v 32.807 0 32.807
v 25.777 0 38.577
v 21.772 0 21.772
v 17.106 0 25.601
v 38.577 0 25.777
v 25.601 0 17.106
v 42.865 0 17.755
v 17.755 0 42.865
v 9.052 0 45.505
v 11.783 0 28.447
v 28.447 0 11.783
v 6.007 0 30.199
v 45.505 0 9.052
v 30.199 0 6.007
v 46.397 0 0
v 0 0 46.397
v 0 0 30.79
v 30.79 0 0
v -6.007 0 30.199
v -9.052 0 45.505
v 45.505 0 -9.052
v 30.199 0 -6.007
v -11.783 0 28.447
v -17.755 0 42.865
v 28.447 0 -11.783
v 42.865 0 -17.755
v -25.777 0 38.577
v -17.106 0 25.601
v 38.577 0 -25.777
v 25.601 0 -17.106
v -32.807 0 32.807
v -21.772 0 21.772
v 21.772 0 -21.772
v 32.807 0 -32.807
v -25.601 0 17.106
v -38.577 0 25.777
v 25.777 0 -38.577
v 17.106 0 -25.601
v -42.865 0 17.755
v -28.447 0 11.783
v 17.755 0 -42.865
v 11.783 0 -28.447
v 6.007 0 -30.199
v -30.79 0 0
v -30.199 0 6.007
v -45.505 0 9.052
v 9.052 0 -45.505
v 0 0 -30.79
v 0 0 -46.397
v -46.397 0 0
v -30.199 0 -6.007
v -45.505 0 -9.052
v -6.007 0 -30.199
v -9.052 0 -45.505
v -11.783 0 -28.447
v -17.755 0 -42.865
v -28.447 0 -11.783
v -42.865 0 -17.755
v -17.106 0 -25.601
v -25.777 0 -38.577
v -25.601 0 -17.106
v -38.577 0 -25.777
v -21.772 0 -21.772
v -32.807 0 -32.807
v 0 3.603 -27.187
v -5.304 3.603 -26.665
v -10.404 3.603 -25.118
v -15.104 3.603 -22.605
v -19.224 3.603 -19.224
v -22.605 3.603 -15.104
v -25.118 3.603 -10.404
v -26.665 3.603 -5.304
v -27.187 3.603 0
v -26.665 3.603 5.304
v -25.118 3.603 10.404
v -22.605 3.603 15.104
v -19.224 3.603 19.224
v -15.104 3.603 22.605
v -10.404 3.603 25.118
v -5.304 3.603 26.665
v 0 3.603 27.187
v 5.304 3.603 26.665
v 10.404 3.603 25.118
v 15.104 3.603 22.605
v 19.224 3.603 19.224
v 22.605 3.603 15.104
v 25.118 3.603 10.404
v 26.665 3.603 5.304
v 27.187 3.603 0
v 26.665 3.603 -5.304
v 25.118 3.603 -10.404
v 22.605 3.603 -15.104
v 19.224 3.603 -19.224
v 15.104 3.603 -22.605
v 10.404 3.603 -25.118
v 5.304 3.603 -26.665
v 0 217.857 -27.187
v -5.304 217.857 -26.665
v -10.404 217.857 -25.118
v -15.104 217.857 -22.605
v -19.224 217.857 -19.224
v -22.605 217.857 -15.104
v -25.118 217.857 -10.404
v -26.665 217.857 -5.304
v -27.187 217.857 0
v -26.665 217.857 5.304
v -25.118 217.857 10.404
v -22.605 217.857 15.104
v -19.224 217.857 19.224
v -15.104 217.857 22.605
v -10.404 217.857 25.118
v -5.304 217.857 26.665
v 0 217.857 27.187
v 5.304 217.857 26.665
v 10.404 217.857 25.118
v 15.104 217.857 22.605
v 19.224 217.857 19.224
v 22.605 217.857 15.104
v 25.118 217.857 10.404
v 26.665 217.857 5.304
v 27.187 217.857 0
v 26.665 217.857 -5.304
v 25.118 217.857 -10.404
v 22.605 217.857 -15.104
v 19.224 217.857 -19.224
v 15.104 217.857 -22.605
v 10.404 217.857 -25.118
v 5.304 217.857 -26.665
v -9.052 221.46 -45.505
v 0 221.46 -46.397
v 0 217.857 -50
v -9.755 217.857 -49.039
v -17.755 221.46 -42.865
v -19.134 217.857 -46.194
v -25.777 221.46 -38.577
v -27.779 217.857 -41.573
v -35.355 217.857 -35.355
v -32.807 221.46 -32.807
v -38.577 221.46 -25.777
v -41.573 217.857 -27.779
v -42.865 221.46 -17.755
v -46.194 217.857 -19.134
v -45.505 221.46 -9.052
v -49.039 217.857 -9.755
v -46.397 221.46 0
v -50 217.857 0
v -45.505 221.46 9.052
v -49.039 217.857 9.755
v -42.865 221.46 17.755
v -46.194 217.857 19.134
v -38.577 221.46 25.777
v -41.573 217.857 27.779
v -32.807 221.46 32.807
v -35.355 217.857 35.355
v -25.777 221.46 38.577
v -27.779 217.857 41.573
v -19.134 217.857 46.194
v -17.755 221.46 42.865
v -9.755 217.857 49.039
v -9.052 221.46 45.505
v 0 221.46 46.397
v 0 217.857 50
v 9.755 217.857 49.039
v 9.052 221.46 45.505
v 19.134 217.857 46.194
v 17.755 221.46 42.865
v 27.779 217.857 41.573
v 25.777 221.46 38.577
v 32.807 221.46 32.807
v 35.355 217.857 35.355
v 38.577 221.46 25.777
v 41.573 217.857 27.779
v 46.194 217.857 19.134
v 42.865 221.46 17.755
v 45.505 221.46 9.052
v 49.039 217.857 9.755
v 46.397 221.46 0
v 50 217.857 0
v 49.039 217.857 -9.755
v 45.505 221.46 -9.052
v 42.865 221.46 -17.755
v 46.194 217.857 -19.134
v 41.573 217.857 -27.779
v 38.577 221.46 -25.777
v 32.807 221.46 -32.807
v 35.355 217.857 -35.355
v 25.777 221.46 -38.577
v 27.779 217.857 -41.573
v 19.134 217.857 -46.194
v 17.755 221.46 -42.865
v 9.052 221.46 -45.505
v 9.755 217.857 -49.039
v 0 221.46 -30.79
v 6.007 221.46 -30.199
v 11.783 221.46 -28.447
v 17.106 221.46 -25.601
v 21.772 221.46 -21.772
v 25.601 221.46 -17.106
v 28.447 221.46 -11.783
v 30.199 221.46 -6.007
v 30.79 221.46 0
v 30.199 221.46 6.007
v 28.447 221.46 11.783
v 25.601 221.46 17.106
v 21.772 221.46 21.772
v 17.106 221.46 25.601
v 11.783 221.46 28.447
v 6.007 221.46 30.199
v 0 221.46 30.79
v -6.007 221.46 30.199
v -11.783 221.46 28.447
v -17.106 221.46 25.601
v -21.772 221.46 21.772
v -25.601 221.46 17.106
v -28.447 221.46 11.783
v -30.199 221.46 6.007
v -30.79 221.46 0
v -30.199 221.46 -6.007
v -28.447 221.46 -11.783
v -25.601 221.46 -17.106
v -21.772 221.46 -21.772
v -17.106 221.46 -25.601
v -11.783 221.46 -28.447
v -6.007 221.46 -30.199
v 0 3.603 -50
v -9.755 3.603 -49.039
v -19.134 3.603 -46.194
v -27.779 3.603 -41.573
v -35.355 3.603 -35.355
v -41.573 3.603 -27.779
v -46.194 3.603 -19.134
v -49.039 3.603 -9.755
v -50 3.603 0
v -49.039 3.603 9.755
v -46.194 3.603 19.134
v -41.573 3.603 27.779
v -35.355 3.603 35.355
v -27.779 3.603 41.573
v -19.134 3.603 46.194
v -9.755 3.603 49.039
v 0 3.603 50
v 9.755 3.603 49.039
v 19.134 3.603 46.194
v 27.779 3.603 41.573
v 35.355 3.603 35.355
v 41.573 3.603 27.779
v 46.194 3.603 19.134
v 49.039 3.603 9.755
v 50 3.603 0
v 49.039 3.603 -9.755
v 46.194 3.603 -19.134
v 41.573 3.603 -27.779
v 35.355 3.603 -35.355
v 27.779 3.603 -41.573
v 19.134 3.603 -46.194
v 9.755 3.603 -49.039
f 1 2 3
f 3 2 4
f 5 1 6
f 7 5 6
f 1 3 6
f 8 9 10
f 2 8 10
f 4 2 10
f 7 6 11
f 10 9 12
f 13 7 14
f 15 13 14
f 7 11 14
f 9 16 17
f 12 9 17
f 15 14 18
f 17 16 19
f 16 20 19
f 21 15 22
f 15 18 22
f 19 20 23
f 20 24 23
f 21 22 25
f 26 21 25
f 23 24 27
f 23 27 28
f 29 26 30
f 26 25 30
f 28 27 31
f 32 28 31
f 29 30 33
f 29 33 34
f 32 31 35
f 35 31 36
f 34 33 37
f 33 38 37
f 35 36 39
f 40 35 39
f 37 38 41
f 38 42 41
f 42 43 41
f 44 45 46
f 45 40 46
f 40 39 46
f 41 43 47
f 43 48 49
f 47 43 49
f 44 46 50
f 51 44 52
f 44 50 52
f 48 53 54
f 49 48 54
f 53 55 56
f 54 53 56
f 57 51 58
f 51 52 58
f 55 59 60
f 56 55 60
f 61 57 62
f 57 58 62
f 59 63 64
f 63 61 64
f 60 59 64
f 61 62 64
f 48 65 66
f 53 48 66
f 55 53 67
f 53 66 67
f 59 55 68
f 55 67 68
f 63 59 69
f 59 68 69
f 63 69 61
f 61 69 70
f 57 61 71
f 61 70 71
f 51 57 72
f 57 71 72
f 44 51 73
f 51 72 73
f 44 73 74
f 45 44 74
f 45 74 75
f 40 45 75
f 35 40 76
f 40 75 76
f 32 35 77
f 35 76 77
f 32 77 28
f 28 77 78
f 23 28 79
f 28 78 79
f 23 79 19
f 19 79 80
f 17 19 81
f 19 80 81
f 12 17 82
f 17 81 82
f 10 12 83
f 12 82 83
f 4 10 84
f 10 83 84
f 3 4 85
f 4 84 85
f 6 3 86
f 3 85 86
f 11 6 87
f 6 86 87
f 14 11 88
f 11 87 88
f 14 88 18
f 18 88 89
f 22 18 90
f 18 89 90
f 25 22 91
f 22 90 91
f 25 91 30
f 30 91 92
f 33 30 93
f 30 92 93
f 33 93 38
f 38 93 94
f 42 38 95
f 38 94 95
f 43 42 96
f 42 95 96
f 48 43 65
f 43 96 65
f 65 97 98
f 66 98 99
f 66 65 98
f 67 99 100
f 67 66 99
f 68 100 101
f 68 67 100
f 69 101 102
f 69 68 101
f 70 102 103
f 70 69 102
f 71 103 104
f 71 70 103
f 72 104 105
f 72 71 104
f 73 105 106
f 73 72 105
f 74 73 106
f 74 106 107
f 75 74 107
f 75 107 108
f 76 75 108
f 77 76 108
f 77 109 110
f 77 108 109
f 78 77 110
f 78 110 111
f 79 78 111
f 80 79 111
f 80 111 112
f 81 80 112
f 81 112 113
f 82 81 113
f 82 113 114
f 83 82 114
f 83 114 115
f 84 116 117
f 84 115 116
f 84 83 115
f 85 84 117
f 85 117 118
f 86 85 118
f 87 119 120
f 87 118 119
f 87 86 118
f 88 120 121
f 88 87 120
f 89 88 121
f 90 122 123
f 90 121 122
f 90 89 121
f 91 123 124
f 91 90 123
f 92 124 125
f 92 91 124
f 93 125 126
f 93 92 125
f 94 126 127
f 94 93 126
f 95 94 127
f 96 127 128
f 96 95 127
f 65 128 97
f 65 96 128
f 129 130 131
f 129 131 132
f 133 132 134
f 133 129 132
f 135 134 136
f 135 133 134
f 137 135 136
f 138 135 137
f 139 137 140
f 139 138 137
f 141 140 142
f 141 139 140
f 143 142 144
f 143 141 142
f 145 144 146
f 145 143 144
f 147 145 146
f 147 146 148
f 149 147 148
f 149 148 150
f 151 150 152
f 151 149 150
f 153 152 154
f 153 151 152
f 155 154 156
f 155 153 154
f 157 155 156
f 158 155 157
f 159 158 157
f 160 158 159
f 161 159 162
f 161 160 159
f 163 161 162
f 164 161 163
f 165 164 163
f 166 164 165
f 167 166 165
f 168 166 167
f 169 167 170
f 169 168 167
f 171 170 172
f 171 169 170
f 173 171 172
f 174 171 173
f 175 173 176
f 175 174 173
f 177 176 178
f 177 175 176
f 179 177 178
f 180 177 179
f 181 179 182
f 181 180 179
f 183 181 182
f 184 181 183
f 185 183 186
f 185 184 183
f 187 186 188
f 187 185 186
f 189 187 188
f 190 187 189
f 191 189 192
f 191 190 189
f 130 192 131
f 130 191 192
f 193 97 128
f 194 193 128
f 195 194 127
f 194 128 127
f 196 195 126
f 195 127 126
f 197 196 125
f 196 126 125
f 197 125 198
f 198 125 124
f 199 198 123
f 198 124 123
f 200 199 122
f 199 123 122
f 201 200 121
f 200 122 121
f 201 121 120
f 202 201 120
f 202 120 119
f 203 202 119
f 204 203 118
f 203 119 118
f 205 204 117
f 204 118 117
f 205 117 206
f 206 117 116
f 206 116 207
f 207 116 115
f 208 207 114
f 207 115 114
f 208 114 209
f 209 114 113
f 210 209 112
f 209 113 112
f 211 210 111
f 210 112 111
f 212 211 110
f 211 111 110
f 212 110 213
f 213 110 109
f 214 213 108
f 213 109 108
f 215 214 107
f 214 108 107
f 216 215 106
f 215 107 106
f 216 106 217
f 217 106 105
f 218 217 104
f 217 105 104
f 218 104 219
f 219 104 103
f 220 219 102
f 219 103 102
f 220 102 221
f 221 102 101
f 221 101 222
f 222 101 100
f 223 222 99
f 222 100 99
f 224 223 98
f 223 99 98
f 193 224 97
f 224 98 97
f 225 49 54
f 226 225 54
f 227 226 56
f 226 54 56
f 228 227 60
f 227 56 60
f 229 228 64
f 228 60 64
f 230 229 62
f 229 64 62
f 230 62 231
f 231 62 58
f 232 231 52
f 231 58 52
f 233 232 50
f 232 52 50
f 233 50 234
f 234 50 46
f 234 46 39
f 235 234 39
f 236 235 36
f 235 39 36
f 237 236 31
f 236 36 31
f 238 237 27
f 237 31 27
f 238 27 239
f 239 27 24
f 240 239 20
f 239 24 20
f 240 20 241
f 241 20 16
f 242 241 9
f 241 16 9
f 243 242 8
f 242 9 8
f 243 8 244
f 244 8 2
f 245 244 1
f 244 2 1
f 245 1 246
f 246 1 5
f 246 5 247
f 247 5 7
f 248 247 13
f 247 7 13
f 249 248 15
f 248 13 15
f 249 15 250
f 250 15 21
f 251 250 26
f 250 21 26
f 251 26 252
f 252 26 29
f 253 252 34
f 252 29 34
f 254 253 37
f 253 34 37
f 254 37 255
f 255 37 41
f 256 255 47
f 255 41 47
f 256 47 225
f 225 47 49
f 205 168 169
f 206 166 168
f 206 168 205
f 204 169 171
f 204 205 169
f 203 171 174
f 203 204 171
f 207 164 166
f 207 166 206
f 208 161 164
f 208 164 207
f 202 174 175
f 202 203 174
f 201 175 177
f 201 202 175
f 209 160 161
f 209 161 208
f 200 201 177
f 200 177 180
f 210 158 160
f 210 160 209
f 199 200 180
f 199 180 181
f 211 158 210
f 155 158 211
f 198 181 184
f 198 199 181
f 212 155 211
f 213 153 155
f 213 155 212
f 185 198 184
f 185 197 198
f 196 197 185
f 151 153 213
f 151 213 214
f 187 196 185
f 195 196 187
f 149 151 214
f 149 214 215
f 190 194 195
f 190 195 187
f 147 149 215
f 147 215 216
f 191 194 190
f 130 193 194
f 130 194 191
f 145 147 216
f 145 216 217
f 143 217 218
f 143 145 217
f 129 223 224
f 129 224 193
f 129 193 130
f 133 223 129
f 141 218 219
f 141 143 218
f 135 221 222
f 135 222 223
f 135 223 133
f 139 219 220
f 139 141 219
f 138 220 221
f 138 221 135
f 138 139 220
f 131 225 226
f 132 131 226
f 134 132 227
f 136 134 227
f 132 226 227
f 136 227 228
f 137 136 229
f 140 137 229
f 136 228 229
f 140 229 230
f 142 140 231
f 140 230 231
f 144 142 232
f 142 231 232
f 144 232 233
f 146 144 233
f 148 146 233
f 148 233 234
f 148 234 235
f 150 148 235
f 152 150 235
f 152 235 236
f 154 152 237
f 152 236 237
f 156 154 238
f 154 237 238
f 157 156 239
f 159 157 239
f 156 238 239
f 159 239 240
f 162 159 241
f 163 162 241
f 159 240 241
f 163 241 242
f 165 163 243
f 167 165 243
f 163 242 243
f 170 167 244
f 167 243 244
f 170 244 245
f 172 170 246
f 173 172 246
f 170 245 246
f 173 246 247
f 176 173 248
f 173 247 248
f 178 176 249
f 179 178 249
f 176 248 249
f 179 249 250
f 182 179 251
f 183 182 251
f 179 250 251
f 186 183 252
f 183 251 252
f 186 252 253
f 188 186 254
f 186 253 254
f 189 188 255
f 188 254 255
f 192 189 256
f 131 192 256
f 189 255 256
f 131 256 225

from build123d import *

# Parameters (mm, degrees)
SKETCH1_R           = 50
BOSS_EXTRUDE1_DEPTH = 221.459907417
SKETCH2_R           = 27.18721444
CUT_EXTRUDE1_DEPTH  = 233.474709578
CHAMFER1_SIZE       = 3.603240626


with BuildPart() as part:
    # Sketch1 → Boss-Extrude1 (new body)
    with BuildSketch(Plane(origin=(0, 0, 0), x_dir=(1, 0, 0), z_dir=(0, 1, 0))):
        Circle(SKETCH1_R)
    extrude(amount=BOSS_EXTRUDE1_DEPTH)

    # Sketch2 → Cut-Extrude1 (cut, through all)
    with BuildSketch(Plane(origin=(0, 0, 0), x_dir=(1, 0, 0), z_dir=(0, 1, 0))):
        Circle(SKETCH2_R)
    extrude(amount=CUT_EXTRUDE1_DEPTH, mode=Mode.SUBTRACT)

    # Chamfer1
    chamfer1_edges = [part.edges().sort_by_distance(p)[0] for p in [
        (-27.18721444, 221.459907417, 0),
        (-27.18721444, 0, 0),
        (-50, 0, 0),
        (-50, 221.459907417, 0),
    ]]
    chamfer(chamfer1_edges, length=CHAMFER1_SIZE)


solid = part.part
